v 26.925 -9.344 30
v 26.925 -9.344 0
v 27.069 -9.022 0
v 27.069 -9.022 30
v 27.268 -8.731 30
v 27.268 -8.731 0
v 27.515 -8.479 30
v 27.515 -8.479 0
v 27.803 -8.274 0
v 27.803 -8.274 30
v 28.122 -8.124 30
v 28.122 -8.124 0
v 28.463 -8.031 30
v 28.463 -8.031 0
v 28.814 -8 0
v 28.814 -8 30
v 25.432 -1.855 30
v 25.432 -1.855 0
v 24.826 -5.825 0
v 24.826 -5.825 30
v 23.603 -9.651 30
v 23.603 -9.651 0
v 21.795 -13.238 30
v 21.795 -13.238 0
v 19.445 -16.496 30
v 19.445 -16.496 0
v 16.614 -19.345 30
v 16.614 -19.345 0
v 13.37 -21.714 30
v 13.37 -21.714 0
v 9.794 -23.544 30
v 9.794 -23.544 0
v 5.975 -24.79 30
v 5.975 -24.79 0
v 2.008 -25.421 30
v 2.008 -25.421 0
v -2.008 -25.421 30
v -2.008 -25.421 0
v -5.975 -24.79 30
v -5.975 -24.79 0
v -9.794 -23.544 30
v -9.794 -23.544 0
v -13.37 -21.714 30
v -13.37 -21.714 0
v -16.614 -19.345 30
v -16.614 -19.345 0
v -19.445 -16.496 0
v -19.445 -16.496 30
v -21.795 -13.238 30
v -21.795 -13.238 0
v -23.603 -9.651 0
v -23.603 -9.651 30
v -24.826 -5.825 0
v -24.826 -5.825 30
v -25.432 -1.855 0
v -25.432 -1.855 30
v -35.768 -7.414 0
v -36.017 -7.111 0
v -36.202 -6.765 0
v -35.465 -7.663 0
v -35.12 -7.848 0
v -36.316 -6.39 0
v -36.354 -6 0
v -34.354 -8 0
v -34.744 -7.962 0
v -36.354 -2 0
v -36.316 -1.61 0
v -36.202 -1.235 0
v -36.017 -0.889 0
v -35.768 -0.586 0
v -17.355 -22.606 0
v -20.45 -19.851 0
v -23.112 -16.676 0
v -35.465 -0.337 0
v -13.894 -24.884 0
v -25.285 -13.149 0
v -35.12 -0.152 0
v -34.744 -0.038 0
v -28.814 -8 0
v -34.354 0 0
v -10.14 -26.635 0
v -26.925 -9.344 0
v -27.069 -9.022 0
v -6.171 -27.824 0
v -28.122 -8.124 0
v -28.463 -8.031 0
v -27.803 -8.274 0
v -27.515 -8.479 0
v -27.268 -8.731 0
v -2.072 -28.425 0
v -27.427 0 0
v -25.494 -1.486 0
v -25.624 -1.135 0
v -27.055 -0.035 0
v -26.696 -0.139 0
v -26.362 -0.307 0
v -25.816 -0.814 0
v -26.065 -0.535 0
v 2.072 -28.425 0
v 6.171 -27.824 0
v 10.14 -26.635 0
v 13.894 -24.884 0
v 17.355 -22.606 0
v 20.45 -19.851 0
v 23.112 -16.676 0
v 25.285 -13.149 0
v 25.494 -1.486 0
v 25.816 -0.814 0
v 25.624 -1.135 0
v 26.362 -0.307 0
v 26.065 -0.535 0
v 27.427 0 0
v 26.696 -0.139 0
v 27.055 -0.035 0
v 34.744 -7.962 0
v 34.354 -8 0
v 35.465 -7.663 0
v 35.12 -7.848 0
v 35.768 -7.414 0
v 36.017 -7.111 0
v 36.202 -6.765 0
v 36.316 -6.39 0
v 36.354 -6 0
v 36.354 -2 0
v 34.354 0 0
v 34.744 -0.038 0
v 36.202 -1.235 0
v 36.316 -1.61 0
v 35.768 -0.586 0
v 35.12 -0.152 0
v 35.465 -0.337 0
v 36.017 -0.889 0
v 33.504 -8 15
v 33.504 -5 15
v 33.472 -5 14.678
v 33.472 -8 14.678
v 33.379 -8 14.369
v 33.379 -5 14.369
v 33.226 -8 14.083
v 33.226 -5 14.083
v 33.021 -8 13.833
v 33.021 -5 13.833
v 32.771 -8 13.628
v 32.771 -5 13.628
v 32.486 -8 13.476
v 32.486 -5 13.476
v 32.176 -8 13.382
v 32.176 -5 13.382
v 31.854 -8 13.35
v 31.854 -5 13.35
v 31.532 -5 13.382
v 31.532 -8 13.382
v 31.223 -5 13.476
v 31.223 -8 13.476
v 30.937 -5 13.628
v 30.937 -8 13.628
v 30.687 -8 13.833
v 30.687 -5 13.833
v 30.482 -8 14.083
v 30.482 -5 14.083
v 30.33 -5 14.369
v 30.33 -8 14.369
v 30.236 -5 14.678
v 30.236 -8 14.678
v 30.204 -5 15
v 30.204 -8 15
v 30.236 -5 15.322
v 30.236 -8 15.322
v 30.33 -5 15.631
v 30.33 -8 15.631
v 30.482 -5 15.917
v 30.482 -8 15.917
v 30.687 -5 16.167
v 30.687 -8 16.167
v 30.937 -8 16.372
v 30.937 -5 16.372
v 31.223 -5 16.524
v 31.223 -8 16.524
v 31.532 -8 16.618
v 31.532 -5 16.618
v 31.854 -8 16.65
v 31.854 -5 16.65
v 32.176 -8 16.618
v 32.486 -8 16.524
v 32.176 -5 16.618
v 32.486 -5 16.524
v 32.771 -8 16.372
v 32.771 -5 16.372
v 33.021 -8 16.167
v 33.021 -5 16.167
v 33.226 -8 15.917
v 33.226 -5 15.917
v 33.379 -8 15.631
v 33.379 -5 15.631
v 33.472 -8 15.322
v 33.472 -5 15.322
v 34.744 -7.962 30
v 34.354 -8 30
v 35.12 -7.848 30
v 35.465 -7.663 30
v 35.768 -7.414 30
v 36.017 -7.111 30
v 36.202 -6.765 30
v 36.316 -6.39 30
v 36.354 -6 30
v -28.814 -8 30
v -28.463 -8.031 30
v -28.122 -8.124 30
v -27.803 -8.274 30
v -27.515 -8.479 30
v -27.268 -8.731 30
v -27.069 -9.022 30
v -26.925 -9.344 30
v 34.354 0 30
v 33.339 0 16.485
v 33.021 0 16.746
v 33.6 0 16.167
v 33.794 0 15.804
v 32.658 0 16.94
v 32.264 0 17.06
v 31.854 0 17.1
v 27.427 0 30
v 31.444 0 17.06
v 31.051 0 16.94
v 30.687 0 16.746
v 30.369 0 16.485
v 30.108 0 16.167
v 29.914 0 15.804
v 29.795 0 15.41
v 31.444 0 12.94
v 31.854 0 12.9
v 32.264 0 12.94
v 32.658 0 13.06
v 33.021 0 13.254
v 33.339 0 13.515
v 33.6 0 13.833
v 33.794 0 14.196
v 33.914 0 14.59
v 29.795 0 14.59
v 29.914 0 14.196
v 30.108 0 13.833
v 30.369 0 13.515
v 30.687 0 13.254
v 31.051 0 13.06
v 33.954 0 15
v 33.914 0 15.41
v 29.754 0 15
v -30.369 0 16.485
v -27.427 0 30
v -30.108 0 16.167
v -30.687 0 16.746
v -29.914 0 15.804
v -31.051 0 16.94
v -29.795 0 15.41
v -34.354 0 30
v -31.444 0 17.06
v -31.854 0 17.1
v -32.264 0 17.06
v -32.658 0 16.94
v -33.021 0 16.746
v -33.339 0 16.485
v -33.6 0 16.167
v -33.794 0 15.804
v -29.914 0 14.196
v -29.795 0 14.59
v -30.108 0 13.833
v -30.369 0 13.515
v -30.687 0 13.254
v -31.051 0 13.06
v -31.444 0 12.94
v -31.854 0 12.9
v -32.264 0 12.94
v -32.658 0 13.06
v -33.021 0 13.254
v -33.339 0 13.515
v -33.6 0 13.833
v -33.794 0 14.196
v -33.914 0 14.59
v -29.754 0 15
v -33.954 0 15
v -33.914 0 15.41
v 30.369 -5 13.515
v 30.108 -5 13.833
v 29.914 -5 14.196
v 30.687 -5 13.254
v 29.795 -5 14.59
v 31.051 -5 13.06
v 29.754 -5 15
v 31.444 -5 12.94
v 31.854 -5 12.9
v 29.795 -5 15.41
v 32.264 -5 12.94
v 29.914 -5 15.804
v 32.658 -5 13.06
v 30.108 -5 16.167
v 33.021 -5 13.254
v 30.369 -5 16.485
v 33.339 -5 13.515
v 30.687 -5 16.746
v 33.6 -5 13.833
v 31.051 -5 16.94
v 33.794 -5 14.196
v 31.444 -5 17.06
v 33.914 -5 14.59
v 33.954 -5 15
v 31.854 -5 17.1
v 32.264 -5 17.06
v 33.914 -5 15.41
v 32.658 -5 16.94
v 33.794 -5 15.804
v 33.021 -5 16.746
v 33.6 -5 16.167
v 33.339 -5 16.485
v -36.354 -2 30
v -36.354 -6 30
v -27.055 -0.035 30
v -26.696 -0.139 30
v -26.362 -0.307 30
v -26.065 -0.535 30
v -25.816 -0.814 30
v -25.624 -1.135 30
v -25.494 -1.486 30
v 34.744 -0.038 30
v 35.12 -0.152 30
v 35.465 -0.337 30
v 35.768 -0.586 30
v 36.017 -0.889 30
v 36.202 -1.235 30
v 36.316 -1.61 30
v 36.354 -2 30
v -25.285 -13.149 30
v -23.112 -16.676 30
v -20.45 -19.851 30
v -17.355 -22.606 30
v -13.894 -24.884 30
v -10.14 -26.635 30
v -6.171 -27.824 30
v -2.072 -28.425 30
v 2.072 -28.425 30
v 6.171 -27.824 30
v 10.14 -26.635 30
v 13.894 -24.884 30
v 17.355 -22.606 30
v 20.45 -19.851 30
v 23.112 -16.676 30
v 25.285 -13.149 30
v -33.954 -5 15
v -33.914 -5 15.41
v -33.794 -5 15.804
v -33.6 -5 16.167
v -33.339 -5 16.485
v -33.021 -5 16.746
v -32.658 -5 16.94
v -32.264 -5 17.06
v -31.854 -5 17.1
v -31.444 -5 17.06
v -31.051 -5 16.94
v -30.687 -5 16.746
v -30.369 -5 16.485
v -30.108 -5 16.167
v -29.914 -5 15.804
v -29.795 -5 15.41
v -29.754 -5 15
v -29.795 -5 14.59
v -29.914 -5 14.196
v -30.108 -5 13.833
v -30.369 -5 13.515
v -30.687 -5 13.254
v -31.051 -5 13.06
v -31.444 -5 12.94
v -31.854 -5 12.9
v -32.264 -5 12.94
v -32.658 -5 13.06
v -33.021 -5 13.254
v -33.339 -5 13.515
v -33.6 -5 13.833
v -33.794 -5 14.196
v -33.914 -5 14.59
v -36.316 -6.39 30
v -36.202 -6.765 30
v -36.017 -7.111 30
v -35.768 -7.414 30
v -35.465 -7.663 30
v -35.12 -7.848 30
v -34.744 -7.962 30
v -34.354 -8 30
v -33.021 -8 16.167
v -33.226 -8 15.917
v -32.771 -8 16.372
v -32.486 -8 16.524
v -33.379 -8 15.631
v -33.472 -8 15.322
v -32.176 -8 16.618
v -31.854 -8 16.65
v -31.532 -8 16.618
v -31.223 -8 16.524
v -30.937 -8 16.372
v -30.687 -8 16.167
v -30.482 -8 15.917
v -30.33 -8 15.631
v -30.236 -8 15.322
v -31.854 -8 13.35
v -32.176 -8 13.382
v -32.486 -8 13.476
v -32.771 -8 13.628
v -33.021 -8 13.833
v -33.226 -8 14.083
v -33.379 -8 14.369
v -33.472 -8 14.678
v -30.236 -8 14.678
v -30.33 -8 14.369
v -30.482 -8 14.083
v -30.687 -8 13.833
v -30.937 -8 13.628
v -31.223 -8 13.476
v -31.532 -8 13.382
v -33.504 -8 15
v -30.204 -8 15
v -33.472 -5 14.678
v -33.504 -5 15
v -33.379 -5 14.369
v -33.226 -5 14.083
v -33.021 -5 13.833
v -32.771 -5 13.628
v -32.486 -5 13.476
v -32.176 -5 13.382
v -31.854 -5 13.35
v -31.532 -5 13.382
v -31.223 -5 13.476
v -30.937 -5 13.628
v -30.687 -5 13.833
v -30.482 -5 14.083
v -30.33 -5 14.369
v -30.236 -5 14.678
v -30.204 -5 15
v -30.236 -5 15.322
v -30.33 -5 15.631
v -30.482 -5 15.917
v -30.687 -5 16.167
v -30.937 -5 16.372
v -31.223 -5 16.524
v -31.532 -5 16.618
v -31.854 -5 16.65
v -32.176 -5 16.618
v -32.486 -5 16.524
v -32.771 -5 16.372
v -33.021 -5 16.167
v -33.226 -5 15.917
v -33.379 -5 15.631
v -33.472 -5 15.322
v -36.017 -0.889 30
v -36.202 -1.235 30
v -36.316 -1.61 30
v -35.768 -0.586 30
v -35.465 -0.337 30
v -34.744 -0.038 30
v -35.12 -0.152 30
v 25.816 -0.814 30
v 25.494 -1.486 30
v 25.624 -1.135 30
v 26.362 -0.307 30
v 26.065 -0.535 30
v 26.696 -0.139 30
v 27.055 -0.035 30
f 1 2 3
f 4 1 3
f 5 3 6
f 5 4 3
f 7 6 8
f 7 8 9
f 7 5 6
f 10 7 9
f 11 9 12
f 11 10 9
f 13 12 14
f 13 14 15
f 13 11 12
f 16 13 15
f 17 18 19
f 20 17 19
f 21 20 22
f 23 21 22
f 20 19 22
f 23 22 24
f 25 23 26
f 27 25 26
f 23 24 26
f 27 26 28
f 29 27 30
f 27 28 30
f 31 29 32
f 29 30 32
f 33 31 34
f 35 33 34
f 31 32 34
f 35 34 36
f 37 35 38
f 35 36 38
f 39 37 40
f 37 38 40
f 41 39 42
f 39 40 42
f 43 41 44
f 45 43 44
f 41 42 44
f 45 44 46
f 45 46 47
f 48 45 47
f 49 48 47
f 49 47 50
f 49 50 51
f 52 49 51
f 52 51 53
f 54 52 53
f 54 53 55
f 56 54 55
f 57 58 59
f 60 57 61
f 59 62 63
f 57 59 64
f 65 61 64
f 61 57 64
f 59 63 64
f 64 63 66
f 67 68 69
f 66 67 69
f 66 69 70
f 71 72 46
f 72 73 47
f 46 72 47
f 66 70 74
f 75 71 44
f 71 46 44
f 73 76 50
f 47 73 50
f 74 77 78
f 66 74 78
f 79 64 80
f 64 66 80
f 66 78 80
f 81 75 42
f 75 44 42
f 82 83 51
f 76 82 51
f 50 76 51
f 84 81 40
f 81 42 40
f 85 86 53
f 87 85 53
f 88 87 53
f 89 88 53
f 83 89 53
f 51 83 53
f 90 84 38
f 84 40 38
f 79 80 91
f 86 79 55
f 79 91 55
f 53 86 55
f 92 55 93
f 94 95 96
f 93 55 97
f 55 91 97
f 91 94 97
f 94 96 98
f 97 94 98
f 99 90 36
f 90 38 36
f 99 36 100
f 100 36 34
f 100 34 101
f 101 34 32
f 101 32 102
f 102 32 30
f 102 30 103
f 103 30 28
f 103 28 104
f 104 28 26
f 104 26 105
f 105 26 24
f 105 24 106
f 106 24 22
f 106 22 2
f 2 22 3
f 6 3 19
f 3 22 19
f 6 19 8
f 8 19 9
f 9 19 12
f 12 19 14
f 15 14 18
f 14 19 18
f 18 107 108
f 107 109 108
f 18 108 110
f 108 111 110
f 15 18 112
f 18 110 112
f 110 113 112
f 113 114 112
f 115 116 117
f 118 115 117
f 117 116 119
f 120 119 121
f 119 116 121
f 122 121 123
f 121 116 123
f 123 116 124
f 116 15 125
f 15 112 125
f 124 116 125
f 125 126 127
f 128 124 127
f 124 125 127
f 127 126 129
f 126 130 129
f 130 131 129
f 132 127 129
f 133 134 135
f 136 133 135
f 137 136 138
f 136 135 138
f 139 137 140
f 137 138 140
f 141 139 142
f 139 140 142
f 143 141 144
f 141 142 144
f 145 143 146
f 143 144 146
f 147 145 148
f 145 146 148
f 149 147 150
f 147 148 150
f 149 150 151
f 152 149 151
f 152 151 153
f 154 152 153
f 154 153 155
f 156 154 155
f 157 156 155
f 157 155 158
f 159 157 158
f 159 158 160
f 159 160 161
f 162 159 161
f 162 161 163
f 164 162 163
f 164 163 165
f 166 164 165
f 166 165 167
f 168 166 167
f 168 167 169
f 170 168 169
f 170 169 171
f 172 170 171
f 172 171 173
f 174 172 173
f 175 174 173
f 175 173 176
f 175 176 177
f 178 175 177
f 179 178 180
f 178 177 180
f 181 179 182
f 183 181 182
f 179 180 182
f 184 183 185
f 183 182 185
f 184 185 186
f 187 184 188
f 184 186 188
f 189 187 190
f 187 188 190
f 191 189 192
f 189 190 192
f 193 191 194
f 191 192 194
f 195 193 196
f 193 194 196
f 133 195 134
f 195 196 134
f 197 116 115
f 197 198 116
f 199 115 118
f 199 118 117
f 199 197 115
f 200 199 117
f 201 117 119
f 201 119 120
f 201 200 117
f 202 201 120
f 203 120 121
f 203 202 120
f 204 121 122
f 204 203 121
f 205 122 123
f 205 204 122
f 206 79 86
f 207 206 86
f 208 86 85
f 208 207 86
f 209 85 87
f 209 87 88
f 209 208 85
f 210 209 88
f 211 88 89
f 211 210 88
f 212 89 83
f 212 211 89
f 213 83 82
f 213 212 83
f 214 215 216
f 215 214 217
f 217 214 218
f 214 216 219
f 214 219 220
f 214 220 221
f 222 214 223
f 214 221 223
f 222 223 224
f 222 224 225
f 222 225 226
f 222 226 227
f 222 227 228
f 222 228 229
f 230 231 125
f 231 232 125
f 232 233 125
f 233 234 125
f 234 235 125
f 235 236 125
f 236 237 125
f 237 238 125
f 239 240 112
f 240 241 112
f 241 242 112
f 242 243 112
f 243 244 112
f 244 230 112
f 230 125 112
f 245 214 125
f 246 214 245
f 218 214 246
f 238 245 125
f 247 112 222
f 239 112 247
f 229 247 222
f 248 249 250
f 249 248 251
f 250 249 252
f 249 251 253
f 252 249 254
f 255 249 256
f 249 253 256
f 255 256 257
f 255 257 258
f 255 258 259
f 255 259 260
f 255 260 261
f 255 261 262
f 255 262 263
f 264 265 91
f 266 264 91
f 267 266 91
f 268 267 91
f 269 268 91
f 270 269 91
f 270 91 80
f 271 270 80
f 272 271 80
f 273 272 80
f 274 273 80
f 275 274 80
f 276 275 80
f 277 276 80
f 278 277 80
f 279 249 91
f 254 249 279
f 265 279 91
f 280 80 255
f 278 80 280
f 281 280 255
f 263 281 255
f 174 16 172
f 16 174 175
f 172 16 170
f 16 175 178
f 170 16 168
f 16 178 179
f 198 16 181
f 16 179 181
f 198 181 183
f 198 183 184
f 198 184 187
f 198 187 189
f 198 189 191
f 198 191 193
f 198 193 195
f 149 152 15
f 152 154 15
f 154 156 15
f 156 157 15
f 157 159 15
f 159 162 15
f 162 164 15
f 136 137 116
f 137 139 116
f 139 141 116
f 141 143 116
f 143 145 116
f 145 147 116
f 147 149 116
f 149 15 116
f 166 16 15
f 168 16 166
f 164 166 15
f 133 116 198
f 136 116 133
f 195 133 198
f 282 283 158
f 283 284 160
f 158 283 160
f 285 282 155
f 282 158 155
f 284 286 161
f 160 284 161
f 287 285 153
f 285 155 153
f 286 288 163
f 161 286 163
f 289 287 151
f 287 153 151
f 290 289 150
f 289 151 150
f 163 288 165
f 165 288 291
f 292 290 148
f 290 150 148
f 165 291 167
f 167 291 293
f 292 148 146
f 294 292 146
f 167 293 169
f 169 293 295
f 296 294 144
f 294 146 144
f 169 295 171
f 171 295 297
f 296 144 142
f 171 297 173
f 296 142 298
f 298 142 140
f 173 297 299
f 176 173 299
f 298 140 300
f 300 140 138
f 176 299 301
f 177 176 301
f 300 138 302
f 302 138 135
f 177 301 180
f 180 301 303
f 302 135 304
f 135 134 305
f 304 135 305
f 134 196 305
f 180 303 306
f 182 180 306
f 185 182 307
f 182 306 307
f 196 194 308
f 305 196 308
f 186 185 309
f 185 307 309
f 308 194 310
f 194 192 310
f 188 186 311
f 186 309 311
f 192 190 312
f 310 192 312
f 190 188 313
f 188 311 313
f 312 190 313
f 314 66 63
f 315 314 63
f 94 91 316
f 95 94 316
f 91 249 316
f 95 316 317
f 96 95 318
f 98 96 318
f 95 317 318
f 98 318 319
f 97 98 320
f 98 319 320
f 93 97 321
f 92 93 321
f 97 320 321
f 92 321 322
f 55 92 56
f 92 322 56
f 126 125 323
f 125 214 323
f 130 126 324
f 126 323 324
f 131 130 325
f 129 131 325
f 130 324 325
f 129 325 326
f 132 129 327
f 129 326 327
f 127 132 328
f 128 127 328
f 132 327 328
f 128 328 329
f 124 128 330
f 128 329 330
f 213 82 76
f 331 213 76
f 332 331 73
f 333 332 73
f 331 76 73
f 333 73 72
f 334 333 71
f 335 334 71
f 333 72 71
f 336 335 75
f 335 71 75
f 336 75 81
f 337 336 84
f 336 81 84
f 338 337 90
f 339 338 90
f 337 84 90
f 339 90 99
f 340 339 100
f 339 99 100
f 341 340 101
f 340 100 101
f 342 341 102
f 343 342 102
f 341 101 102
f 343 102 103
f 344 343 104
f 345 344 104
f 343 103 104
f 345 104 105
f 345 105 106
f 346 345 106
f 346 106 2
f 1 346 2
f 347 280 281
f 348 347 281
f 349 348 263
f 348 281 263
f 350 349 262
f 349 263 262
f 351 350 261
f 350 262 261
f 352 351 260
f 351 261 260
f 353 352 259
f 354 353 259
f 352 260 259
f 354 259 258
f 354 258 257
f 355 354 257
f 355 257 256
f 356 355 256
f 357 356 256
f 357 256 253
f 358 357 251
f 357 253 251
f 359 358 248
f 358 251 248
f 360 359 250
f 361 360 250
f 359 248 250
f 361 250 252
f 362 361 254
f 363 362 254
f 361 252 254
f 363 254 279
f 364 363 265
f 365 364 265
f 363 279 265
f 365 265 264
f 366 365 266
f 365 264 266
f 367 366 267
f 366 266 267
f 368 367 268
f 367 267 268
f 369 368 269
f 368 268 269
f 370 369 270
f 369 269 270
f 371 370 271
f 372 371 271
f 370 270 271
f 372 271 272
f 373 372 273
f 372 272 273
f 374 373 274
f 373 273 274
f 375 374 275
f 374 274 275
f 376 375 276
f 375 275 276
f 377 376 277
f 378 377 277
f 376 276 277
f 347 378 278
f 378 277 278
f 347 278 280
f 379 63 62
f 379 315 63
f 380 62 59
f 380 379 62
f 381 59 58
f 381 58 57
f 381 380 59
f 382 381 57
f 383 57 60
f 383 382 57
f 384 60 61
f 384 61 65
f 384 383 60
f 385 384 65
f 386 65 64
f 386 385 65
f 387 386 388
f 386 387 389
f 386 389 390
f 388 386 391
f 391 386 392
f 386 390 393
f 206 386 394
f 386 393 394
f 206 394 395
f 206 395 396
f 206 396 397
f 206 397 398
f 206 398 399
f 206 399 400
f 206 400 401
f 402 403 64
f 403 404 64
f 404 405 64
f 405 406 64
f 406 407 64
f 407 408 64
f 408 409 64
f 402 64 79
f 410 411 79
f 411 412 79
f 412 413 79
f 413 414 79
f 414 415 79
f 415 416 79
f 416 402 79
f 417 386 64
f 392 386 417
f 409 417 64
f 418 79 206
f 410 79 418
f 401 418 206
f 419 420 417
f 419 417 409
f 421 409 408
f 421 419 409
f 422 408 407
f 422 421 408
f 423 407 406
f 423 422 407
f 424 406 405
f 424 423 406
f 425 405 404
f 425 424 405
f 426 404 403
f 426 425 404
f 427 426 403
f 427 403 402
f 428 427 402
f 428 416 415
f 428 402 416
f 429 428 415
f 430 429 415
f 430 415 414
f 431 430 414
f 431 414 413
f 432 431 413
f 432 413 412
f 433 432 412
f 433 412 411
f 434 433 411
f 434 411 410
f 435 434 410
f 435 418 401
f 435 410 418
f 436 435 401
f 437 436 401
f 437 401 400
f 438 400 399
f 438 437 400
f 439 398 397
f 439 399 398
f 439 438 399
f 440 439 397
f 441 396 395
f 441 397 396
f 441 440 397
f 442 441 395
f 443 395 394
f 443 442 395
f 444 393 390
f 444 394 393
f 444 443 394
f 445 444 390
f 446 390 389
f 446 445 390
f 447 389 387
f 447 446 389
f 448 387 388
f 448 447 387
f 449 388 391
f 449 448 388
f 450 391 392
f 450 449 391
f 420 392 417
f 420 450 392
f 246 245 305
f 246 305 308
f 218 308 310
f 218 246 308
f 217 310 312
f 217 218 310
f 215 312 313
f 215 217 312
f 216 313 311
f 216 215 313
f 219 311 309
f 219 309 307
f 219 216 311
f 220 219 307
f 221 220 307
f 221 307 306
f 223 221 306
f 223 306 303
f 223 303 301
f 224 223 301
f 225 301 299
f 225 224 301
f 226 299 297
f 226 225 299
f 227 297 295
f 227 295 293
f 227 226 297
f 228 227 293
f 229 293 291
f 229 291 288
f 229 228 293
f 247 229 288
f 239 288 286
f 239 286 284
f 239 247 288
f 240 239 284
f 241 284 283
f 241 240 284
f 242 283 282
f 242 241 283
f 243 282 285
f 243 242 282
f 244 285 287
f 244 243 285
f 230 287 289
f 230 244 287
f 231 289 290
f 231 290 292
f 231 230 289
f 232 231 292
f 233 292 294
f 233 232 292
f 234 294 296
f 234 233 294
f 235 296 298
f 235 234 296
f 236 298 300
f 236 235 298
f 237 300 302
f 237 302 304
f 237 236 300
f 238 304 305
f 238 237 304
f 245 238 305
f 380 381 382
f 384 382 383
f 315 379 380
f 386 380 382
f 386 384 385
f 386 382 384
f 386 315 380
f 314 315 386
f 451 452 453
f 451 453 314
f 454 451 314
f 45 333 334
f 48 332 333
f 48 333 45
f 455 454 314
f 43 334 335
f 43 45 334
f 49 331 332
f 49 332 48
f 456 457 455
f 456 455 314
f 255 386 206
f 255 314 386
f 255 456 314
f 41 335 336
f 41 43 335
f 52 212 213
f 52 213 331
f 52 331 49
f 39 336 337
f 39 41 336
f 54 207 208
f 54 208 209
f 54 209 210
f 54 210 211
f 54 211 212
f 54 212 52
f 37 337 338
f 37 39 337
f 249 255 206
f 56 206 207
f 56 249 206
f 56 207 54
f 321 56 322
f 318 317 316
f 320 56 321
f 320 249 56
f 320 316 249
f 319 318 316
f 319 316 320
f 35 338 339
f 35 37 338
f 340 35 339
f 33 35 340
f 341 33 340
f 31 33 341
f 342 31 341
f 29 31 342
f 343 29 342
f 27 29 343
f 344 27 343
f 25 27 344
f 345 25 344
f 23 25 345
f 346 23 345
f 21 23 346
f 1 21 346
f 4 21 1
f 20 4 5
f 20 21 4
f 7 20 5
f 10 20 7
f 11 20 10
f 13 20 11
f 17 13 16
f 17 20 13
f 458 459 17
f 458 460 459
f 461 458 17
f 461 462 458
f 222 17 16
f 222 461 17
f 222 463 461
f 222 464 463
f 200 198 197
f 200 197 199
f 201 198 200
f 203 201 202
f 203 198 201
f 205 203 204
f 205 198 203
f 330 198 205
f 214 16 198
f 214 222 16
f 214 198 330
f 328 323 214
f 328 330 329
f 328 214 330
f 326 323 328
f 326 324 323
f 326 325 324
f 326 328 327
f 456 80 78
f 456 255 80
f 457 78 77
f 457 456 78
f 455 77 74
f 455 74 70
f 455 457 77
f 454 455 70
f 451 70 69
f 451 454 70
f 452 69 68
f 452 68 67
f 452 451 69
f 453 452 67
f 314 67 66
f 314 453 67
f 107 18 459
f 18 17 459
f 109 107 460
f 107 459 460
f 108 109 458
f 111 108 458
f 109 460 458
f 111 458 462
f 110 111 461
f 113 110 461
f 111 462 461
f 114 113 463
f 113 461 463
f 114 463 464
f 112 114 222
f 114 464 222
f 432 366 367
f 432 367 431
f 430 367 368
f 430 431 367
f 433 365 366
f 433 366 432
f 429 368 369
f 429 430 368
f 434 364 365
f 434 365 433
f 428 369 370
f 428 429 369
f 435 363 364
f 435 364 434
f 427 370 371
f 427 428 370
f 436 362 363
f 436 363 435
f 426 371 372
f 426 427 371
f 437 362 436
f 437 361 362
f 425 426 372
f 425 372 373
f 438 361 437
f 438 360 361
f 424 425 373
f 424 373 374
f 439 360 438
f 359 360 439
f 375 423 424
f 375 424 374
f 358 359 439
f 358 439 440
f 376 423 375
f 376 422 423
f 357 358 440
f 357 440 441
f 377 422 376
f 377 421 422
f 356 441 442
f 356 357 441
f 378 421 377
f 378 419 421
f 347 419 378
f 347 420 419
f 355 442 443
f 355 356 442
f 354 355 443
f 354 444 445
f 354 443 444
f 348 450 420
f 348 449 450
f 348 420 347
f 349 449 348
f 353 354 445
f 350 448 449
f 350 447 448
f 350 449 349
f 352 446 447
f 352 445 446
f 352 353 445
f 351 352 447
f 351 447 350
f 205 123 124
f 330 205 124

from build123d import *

# Parameters (mm, degrees)
BOSS_EXTRUDE1_DEPTH = 30
SKETCH5_R           = 2.1
CUT_EXTRUDE1_DEPTH  = 5
SKETCH6_R           = 1.65
CUT_EXTRUDE2_DEPTH  = 29.5
FILLET1_R           = 2


with BuildPart() as part:
    # Sketch3 → Boss-Extrude1 (new body)
    with BuildSketch(Plane.XY):
        with BuildLine():
            Line((-25.5, 0), (-36.354158733, 0))
            Line((-36.354158733, 0), (-36.354158733, -8))
            Line((-36.354158733, -8), (-27.354158733, -8))
            ThreePointArc((-27.354158733, -8), (0, -28.5), (27.354158733, -8))
            Line((27.354158733, -8), (36.354158733, -8))
            Line((36.354158733, -8), (36.354158733, 0))
            Line((36.354158733, 0), (25.5, 0))
            ThreePointArc((25.5, 0), (0, -25.5), (-25.5, 0))
        make_face()
    extrude(amount=BOSS_EXTRUDE1_DEPTH)

    # Sketch5 → Cut-Extrude1 (cut)
    with BuildSketch(Plane.XZ):
        with Locations((31.854158733, 15)):
            Circle(SKETCH5_R)
    cut_extrude1 = extrude(amount=CUT_EXTRUDE1_DEPTH, mode=Mode.SUBTRACT)

    # Sketch6 → Cut-Extrude2 (cut, through all)
    with BuildSketch(Plane(origin=(0, 0, 0), x_dir=(1, 0, 0), z_dir=(0, 1, 0))):
        with Locations((31.854158733, -15)):
            Circle(SKETCH6_R)
    cut_extrude2 = extrude(amount=-CUT_EXTRUDE2_DEPTH, mode=Mode.SUBTRACT)

    # Mirror1: Cut-Extrude1, Cut-Extrude2 across plane
    add(cut_extrude1.mirror(Plane(origin=(0, 0, 0), x_dir=(0, 0, 1), z_dir=(1, 0, 0))), mode=Mode.SUBTRACT)
    add(cut_extrude2.mirror(Plane(origin=(0, 0, 0), x_dir=(0, 0, 1), z_dir=(1, 0, 0))), mode=Mode.SUBTRACT)

    # Fillet1
    fillet1_edges = [part.edges().sort_by_distance(p)[0] for p in [
        (-36.354158733, 0, 15),
        (-25.5, 0, 15),
        (25.5, 0, 15),
        (36.354158733, 0, 15),
        (36.354158733, -8, 15),
        (27.354158733, -8, 15),
        (-27.354158733, -8, 15),
        (-36.354158733, -8, 15),
    ]]
    fillet(fillet1_edges, radius=FILLET1_R)


solid = part.part
